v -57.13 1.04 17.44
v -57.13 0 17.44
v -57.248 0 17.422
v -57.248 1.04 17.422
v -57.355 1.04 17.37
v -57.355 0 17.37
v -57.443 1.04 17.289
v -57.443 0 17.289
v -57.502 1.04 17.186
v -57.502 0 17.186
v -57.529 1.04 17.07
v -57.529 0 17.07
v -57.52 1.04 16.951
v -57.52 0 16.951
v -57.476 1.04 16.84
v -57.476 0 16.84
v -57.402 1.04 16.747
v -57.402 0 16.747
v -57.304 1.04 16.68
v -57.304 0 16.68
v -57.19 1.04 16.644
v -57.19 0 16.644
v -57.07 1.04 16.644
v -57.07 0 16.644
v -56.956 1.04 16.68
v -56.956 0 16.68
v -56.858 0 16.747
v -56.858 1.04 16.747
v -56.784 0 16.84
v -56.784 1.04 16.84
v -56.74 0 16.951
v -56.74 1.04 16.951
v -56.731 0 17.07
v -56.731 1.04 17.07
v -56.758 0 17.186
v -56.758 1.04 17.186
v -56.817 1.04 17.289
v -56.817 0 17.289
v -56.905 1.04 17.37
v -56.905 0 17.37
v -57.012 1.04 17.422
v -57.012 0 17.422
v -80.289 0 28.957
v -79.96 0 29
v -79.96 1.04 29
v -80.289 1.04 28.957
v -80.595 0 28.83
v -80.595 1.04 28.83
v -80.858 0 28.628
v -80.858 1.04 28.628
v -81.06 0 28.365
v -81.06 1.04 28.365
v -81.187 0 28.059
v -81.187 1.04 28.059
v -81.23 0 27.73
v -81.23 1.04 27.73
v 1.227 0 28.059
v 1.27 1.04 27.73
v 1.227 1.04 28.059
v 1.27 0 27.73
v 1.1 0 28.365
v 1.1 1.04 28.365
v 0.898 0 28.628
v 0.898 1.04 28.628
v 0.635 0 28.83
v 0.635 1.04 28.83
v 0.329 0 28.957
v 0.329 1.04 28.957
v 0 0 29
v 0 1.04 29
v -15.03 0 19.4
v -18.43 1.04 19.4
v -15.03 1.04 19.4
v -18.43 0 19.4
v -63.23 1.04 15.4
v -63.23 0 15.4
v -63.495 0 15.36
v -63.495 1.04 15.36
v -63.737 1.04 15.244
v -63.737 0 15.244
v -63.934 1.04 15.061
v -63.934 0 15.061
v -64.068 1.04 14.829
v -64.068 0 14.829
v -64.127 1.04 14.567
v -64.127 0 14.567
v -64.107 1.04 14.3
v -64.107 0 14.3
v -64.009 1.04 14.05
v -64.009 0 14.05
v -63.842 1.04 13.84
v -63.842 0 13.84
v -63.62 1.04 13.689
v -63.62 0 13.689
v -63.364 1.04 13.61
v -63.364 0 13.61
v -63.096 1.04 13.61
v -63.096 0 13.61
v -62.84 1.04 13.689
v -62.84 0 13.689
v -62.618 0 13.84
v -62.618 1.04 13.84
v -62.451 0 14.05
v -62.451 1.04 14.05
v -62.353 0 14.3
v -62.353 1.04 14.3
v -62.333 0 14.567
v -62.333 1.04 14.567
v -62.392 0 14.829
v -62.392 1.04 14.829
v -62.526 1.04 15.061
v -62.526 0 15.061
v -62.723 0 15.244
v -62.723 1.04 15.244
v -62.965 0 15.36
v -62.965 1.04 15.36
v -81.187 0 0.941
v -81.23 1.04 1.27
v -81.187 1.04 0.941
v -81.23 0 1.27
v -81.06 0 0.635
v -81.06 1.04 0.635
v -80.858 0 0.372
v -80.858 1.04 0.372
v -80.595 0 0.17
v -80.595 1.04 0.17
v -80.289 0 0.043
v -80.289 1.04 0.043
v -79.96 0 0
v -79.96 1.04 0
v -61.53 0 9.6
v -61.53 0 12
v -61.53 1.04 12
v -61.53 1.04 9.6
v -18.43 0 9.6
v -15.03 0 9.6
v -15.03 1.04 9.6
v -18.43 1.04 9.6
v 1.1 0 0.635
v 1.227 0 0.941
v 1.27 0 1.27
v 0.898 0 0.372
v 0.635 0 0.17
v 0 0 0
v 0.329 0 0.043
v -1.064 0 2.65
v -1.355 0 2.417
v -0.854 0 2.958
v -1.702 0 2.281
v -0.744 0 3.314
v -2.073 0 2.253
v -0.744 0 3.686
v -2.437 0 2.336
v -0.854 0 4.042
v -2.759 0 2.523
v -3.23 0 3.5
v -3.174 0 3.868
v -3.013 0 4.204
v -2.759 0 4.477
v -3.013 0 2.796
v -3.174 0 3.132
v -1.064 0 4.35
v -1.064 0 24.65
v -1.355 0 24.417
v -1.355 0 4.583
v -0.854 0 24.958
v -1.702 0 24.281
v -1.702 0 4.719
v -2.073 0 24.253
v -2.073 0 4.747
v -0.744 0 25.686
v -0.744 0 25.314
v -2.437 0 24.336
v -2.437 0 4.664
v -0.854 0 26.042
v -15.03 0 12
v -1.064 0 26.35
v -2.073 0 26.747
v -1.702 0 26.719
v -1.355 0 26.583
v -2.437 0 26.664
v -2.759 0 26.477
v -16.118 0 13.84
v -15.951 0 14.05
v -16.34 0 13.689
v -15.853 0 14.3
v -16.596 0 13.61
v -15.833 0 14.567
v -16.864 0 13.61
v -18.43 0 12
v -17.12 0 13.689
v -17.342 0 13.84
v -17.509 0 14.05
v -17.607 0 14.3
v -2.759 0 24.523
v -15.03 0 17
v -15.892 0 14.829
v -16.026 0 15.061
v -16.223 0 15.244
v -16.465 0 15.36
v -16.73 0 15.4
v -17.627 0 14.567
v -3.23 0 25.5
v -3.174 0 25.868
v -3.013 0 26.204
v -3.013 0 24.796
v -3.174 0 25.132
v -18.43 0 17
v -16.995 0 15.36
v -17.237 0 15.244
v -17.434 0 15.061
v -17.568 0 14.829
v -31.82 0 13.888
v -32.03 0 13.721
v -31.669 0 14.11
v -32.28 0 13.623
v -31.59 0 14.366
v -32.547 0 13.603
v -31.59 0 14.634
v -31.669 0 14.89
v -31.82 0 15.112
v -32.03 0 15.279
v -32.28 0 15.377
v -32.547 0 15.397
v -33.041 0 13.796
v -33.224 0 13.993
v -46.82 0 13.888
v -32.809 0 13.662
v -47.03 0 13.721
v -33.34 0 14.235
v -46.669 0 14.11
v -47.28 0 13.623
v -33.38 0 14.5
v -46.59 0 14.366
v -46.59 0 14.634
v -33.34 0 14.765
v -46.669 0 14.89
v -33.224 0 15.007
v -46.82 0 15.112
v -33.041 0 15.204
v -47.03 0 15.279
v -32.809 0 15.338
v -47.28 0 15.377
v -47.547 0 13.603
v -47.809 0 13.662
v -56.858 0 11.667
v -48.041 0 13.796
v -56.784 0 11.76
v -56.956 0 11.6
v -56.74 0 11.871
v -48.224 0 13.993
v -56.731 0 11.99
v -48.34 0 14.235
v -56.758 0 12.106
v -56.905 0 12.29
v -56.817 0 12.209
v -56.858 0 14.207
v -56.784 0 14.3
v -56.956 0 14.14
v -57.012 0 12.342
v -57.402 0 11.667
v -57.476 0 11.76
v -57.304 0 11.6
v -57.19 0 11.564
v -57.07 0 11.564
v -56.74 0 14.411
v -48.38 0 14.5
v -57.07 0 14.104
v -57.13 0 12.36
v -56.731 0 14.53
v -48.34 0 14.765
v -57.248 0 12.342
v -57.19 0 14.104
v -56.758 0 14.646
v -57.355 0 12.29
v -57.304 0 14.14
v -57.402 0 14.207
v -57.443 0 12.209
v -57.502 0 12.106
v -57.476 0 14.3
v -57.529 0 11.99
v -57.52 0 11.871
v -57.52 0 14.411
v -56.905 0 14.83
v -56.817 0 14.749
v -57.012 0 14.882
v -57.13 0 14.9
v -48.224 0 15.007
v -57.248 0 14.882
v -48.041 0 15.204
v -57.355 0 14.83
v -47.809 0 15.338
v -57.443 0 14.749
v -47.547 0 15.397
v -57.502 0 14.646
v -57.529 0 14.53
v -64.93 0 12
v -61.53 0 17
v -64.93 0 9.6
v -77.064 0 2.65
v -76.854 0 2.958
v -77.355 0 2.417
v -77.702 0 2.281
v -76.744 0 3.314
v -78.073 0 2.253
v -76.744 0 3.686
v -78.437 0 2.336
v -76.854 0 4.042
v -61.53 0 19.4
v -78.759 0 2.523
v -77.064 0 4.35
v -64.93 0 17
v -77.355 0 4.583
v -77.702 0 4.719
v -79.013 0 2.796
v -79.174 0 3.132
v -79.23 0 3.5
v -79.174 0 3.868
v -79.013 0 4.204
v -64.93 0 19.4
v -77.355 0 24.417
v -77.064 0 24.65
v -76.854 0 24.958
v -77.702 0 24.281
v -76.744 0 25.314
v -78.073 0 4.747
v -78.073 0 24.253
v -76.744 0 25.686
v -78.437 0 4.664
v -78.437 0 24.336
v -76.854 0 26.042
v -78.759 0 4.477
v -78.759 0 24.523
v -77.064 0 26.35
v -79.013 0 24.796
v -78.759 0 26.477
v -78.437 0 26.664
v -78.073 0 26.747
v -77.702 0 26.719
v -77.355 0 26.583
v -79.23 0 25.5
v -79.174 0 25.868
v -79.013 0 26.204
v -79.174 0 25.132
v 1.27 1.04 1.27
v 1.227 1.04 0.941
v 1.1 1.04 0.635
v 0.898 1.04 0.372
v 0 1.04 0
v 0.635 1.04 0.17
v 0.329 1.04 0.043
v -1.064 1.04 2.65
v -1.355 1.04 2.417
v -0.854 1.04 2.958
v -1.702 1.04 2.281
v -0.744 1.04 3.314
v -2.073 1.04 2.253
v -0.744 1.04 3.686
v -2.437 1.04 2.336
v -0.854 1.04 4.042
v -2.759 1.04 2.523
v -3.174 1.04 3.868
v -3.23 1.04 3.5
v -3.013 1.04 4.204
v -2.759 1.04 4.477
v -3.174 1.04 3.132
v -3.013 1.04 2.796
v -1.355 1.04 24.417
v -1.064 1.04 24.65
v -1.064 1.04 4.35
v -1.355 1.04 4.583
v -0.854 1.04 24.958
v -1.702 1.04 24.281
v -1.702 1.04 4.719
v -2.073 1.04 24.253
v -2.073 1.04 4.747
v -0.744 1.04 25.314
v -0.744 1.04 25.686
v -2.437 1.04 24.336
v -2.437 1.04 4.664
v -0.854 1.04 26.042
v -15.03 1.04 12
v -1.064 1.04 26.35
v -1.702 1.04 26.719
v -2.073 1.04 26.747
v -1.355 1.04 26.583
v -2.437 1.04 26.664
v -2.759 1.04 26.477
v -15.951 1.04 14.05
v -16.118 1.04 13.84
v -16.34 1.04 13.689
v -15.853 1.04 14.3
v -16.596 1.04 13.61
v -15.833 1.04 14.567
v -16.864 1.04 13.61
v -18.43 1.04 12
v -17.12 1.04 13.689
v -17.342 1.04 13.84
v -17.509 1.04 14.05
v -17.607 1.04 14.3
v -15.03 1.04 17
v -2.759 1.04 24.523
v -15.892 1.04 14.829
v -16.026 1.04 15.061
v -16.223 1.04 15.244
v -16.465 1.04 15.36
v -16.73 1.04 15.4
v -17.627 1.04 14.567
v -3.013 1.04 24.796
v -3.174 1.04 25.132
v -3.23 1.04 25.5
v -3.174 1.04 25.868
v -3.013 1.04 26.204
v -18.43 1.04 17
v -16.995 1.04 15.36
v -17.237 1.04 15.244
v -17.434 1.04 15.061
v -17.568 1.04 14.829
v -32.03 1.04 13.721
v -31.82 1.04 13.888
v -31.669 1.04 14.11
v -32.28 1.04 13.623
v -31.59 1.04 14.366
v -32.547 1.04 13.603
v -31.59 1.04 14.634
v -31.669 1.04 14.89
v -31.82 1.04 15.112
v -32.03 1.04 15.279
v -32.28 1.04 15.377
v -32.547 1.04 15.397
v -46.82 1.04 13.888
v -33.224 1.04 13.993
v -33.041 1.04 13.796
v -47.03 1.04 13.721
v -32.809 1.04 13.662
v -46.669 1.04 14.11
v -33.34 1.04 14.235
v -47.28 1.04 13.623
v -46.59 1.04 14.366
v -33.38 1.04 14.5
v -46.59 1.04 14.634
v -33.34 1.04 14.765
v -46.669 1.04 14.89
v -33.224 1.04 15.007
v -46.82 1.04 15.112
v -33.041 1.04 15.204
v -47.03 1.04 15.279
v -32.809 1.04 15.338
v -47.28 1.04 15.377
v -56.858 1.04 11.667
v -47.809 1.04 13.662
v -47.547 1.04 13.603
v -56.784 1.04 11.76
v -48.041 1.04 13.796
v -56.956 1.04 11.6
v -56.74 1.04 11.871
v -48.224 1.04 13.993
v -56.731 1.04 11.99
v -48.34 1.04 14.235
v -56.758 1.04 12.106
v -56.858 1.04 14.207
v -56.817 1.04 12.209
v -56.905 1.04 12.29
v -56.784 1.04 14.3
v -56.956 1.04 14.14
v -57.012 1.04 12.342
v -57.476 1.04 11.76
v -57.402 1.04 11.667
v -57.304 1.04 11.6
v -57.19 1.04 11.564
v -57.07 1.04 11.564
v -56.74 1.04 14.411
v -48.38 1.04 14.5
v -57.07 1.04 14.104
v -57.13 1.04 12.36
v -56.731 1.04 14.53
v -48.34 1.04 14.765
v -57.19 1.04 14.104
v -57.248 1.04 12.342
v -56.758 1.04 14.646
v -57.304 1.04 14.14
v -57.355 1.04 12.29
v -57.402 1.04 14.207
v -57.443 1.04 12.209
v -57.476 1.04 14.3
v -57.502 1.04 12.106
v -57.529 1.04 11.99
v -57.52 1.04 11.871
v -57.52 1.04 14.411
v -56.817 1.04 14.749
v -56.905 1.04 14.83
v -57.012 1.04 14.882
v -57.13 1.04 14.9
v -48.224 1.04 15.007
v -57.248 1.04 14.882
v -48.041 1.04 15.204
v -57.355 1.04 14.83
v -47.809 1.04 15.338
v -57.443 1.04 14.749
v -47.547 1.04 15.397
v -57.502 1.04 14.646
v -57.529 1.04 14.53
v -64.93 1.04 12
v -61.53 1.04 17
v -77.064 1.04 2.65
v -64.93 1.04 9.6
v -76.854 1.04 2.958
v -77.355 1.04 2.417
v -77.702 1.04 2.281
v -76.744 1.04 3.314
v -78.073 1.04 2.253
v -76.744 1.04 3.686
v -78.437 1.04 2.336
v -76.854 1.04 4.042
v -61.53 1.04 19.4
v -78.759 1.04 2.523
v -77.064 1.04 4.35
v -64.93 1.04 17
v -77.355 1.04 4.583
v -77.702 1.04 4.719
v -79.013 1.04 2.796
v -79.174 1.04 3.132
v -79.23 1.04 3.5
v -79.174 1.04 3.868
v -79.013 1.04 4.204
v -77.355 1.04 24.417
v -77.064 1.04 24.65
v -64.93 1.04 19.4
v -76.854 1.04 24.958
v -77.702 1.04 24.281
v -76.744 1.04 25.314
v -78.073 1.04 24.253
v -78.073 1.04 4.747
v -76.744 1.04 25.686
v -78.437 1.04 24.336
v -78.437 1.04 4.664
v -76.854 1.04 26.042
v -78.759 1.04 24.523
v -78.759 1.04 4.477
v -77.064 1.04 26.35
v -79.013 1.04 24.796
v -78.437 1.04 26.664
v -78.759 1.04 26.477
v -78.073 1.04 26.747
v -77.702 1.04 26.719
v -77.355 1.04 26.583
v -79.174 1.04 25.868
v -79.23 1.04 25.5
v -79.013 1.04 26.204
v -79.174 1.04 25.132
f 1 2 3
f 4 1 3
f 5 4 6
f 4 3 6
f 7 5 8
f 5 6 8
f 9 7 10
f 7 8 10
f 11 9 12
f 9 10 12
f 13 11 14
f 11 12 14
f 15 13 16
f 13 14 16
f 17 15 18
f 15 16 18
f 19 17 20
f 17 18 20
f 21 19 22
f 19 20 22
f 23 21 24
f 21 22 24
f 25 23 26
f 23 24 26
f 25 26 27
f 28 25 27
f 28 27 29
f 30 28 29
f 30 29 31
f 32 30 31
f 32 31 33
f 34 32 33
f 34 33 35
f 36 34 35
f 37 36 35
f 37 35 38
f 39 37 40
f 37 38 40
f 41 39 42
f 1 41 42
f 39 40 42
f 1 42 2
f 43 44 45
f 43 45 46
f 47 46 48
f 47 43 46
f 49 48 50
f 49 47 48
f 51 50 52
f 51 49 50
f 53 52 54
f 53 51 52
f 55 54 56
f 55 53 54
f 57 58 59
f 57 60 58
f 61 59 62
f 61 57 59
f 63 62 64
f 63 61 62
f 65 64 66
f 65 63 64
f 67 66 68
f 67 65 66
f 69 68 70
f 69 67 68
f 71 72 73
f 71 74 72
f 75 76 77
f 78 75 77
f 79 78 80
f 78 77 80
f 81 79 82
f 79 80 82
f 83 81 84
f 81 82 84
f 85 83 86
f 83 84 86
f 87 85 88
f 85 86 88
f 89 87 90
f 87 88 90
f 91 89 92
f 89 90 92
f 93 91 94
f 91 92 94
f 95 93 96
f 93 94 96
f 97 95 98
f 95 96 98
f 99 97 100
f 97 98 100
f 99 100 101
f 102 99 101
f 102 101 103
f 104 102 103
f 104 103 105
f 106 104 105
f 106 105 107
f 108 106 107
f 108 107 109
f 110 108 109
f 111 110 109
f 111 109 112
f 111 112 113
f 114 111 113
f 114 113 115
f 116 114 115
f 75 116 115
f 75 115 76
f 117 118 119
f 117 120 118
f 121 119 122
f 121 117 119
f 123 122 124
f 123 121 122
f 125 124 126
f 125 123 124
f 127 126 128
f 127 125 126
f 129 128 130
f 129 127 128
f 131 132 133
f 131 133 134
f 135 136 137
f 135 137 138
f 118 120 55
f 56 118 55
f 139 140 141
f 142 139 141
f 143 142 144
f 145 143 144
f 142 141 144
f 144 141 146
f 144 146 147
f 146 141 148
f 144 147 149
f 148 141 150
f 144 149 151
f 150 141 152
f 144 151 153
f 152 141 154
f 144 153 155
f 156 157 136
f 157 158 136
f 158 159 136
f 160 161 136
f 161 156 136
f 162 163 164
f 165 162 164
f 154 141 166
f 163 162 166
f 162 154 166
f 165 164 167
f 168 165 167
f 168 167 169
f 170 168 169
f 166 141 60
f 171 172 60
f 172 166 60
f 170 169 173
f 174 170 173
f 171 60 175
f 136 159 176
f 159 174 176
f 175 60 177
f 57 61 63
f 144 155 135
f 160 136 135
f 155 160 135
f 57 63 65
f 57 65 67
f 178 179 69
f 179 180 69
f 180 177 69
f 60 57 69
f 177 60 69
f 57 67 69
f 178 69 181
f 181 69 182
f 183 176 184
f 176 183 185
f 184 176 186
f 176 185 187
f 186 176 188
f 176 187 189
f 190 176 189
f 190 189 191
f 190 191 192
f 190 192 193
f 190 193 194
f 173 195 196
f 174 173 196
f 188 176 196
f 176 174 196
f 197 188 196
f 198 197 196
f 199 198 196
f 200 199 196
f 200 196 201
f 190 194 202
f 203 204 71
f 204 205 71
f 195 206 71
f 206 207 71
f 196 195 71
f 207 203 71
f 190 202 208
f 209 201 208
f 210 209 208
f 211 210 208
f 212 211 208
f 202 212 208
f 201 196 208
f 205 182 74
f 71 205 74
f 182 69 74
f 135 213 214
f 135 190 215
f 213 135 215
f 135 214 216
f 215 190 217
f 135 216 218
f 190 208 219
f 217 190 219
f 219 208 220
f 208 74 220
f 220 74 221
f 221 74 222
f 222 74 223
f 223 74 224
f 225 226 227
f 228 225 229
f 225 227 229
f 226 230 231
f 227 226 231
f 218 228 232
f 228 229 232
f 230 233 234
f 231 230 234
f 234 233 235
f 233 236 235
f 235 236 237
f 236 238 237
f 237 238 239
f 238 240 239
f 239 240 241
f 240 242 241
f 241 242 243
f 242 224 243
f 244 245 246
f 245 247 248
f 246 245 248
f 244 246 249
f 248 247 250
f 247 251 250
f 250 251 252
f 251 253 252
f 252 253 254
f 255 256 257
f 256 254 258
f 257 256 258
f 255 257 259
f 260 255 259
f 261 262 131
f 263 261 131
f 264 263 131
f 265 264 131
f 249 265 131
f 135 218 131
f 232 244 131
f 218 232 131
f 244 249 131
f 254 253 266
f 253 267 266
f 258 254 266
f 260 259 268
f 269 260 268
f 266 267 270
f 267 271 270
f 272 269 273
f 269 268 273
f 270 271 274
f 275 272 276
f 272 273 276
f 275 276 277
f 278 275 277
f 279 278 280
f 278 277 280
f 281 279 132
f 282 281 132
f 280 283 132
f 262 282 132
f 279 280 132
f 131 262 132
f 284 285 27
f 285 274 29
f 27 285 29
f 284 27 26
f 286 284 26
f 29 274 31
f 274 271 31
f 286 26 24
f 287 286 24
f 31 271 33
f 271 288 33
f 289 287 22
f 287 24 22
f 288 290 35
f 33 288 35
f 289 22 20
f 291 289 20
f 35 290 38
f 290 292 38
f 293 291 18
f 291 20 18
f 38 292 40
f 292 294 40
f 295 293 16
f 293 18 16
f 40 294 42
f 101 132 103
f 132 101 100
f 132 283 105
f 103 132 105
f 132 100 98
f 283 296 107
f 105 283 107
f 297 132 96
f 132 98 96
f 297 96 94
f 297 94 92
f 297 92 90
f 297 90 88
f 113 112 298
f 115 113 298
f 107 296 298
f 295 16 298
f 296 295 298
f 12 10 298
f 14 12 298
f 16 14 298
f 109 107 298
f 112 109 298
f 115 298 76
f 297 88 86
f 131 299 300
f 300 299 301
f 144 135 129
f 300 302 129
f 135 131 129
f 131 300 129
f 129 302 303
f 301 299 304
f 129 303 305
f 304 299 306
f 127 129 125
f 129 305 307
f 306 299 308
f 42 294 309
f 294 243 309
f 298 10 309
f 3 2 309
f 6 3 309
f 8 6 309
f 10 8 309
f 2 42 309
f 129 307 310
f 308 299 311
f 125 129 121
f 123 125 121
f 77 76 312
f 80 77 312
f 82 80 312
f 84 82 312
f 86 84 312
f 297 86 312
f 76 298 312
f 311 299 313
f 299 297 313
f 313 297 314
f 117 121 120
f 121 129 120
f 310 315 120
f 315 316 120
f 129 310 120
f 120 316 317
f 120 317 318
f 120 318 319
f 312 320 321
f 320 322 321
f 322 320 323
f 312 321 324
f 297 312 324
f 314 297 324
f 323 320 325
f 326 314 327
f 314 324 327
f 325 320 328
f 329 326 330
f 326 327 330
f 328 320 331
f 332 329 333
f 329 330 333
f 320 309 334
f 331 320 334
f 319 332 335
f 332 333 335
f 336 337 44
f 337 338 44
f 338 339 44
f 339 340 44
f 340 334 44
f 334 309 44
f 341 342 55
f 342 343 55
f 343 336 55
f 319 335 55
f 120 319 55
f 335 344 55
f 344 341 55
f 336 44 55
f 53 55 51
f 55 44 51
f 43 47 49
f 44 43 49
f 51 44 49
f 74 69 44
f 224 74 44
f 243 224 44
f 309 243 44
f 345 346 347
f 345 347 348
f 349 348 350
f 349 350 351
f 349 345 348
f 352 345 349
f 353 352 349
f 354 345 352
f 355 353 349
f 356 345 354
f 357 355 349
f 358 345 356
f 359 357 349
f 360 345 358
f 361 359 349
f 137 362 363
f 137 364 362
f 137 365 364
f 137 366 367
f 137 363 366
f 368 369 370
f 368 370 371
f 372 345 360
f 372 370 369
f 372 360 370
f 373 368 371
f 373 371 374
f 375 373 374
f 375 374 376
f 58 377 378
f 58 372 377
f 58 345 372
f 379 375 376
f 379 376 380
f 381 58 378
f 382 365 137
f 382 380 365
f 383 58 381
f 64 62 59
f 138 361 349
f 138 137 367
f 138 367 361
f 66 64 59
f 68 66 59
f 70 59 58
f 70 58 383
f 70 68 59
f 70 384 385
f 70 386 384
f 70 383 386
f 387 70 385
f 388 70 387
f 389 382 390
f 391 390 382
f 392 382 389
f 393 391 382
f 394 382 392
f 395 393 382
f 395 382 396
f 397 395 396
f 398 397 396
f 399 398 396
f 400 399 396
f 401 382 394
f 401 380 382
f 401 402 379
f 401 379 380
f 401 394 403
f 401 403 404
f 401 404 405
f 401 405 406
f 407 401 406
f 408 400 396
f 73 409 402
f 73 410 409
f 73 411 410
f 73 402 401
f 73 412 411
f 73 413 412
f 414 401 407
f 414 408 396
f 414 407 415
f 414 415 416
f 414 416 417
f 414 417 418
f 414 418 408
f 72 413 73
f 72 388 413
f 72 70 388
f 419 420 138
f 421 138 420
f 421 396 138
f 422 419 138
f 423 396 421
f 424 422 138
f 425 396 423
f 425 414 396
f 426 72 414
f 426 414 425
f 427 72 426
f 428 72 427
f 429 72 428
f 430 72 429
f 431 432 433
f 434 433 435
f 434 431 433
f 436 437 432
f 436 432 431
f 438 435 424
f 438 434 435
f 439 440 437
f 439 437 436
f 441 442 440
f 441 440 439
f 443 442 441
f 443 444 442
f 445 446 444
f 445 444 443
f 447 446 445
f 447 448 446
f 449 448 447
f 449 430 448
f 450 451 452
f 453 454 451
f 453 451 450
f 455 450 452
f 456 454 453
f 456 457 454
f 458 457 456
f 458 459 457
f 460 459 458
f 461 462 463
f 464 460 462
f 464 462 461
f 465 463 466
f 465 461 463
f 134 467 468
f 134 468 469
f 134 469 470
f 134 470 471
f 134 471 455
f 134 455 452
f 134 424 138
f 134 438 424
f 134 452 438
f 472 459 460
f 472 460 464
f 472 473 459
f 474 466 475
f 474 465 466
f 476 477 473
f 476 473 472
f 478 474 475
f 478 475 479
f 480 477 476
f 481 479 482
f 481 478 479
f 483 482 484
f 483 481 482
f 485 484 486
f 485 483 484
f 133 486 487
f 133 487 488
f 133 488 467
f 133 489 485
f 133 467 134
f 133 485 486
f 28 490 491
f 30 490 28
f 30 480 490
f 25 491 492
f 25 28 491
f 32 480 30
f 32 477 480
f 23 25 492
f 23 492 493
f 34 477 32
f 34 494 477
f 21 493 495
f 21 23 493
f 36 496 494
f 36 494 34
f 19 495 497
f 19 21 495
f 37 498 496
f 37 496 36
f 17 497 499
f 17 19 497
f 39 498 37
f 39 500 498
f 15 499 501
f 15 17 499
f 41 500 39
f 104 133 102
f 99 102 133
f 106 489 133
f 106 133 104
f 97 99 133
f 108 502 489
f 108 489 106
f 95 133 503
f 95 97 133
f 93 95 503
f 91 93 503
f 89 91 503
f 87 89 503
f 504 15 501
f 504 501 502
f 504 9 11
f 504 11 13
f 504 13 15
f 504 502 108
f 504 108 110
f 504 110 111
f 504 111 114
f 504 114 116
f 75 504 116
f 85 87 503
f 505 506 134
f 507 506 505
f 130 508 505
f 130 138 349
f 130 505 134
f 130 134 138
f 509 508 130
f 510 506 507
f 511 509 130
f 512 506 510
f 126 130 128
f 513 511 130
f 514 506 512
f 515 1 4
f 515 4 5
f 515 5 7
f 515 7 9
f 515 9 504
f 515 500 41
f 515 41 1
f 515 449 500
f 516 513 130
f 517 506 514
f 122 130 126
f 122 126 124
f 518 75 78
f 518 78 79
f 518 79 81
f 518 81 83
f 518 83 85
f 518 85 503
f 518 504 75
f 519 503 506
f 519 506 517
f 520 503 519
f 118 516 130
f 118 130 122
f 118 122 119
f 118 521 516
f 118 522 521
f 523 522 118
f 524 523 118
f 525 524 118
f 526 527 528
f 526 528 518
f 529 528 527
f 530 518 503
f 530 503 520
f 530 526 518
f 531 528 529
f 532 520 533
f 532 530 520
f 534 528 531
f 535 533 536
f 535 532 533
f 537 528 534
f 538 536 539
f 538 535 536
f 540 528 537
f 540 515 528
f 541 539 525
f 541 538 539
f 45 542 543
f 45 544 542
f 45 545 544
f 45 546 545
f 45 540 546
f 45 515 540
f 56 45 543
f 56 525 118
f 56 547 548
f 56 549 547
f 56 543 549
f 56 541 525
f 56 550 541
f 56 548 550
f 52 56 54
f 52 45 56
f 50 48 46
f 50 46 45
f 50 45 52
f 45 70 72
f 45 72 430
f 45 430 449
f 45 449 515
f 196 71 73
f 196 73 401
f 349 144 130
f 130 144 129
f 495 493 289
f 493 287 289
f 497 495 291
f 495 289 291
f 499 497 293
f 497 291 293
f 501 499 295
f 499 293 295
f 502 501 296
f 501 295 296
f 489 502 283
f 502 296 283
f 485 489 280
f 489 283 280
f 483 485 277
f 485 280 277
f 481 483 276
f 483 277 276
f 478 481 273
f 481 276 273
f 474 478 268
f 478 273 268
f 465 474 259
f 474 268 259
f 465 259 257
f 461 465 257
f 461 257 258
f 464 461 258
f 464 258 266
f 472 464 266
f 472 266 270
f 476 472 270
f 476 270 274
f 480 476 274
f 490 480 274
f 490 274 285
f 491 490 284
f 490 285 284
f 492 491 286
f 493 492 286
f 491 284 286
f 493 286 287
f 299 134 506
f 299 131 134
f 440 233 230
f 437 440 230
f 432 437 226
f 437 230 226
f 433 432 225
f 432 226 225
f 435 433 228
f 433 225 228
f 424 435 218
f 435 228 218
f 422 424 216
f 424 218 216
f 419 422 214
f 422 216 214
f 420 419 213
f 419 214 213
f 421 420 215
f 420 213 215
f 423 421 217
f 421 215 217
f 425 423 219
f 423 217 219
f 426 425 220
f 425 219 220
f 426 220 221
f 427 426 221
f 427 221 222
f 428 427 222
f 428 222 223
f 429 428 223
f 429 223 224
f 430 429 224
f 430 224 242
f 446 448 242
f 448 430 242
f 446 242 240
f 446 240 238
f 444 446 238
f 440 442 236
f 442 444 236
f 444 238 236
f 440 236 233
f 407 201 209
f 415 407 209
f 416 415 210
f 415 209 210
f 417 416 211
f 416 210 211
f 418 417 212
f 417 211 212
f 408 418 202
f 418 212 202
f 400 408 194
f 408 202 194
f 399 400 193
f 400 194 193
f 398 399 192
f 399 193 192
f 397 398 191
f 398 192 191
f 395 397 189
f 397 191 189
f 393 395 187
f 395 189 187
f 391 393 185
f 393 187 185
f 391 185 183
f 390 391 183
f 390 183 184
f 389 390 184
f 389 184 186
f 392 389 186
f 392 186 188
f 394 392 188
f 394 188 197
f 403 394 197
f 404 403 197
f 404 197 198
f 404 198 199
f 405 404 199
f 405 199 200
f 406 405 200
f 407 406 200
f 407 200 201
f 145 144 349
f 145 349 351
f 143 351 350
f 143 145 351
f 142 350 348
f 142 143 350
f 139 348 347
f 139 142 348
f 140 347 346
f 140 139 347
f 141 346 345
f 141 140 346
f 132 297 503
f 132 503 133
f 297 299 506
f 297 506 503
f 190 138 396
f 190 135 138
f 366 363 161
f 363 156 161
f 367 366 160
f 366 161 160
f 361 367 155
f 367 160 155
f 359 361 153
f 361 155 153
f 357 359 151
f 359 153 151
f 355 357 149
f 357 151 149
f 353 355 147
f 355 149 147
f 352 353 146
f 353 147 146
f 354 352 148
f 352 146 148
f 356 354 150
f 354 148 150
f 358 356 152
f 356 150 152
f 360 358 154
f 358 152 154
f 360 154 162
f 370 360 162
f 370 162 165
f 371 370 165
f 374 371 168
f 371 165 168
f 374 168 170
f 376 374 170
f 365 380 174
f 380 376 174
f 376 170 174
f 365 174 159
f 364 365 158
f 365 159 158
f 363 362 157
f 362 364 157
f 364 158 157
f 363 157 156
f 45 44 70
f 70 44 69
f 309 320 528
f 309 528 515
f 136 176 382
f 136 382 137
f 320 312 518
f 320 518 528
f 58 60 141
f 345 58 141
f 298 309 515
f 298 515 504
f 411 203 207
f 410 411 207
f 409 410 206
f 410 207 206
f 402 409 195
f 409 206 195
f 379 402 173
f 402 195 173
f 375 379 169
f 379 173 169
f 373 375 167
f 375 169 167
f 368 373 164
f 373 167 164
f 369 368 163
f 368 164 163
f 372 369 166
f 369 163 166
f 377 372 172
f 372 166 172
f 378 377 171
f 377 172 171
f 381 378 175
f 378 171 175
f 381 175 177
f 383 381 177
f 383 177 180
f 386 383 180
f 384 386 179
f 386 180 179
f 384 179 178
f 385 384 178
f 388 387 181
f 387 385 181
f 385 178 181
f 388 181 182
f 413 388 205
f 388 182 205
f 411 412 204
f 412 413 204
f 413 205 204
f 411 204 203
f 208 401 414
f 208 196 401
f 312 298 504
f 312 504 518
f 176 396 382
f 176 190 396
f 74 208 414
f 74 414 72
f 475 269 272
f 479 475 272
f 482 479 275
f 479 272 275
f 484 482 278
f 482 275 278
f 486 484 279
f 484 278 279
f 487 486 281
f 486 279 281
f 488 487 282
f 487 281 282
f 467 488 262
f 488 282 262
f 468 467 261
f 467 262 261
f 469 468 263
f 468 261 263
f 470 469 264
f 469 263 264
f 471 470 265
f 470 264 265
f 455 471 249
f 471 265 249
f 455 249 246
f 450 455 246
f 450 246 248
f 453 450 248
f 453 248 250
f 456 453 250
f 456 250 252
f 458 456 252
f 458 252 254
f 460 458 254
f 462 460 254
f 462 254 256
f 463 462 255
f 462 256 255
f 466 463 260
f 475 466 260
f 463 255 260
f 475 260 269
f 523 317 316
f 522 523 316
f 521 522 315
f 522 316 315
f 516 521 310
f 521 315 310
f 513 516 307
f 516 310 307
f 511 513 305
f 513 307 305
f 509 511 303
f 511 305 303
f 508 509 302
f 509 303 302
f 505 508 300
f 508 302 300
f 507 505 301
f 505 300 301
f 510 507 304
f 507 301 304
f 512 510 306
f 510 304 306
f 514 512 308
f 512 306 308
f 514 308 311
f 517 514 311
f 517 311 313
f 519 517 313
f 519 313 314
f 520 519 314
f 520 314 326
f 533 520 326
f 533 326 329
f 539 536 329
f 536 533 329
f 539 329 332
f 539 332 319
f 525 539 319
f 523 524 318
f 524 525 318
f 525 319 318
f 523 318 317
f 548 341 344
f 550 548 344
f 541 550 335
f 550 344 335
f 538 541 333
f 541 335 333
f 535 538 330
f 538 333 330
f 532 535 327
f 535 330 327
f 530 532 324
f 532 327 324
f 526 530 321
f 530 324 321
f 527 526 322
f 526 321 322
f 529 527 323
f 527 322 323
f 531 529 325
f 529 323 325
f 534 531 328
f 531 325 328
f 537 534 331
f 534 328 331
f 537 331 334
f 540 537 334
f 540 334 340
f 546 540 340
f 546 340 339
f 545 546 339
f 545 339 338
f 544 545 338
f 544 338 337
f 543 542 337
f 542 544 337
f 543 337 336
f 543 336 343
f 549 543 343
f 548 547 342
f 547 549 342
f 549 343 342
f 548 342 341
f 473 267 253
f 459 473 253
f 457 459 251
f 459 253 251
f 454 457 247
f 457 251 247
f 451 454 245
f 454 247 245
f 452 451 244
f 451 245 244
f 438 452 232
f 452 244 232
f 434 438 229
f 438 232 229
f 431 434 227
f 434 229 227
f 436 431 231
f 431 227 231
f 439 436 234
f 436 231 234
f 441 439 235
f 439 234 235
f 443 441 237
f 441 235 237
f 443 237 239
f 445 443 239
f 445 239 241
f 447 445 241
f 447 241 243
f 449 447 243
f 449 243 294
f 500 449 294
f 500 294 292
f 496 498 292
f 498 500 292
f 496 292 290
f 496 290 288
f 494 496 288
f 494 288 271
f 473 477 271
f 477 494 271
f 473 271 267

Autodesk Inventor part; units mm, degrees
ref_plane "YZ Plane" through (0, 0, 0) normal (1, 0, 0) x (0, 1, 0)
ref_plane "XZ Plane" through (0, 0, 0) normal (0, 1, 0) x (-1, 0, 0)
ref_plane "XY Plane" through (0, 0, 0) normal (0, 0, 1) x (1, 0, 0)
sketch "Boceto1" plane through (0, 0, 0) normal (0, 1, 0) x (-1, 0, 0)
  arc A0 (-1.27, 1.27) -> (0, 0) centre (0, 1.27) ccw
  line L0 (0, 0) -> (79.96, 0)
  arc A1 (79.96, 0) -> (81.23, 1.27) centre (79.96, 1.27) ccw
  line L1 (81.23, 1.27) -> (81.23, 27.73)
  arc A2 (81.23, 27.73) -> (79.96, 29) centre (79.96, 27.73) ccw
  line L2 (79.96, 29) -> (0, 29)
  arc A3 (0, 29) -> (-1.27, 27.73) centre (0, 27.73) ccw
  line L3 (-1.27, 27.73) -> (-1.27, 1.27)
  circle A4 centre (77.98, 3.5) radius 1.25
  circle A5 centre (1.98, 25.5) radius 1.25
  circle A6 centre (1.98, 3.5) radius 1.25
  circle A7 centre (77.98, 25.5) radius 1.25
  circle A8 centre (47.48, 14.5) radius 0.9
  circle A9 centre (32.48, 14.5) radius 0.9
  point P0 (0, 0)
extrude "Extrusión1" add sketch "Boceto1" along normal blind 1.04
sketch "Boceto3" plane through (0, 1.04, 0) normal (0, 1, 0) x (1, 0, 0)
  circle A0 centre (-63.23, -14.5) radius 0.9
  circle A1 centre (-16.73, -14.5) radius 0.9
  line L0 (-81.23, -1.27) -> (-81.23, -27.73) projected
  line L1 (0, 0) -> (-79.96, 0) projected
  line L2 (1.27, -27.73) -> (1.27, -1.27) projected
  line L3 (-79.96, -29) -> (0, -29) projected
  dimension "d15" = 1.8
  dimension "d16" = 1.8
  dimension "d17" = 18
  dimension "d18" = 14.5
  dimension "d19" = 18
  dimension "d20" = 14.5
hole "Agujero2" at (-63.23, 1.04, 14.5) at (-16.73, 1.04, 14.5) direction (0, -1, 0) diameter 1.8 end through all
sketch "Boceto4" plane through (0, 1.04, 0) normal (0, 1, 0) x (1, 0, 0)
  circle A0 centre (-57.13, -17.04) radius 0.4
  line L0 (-81.23, -1.27) -> (-81.23, -27.73) projected
  line L1 (-79.96, -29) -> (0, -29) projected
  circle A1 centre (-57.13, -14.5) radius 0.4
  circle A2 centre (-57.13, -11.96) radius 0.4
  line L2 (0, 0) -> (-79.96, 0) projected
  dimension "d28" = 0.8
  dimension "d29" = 24.1
  dimension "d30" = 11.96
  dimension "d31" = 0.8
  dimension "d32" = 0.8
  dimension "d33" = 11.96
  dimension "d34" = 2.54
  dimension "d35" = 2.54
hole "Agujero3" at (-57.13, 1.04, 17.04) at (-57.13, 1.04, 14.5) at (-57.13, 1.04, 11.96) direction (0, -1, 0) diameter 0.8 end through all
sketch "Boceto5" plane through (0, 0, 0) normal (0, -1, 0) x (1, 0, 0)
  line L0 (-15.03, 9.6) -> (-18.43, 9.6)
  line L1 (-18.43, 9.6) -> (-18.43, 12)
  line L2 (-18.43, 12) -> (-15.03, 12)
  line L3 (-15.03, 12) -> (-15.03, 9.6)
  line L4 (-79.96, 29) -> (0, 29) projected
  line L5 (1.27, 27.73) -> (1.27, 1.27) projected
  line L6 (-15.03, 17) -> (-18.43, 17)
  line L7 (-18.43, 17) -> (-18.43, 19.4)
  line L8 (-18.43, 19.4) -> (-15.03, 19.4)
  line L9 (-15.03, 19.4) -> (-15.03, 17)
  line L10 (0, 0) -> (-79.96, 0) projected
  line L11 (-61.53, 9.6) -> (-64.93, 9.6)
  line L12 (-64.93, 9.6) -> (-64.93, 12)
  line L13 (-64.93, 12) -> (-61.53, 12)
  line L14 (-61.53, 12) -> (-61.53, 9.6)
  line L15 (-81.23, 1.27) -> (-81.23, 27.73) projected
  line L16 (-61.53, 17) -> (-64.93, 17)
  line L17 (-64.93, 17) -> (-64.93, 19.4)
  line L18 (-64.93, 19.4) -> (-61.53, 19.4)
  line L19 (-61.53, 19.4) -> (-61.53, 17)
  dimension "d43" = 3.4
  dimension "d44" = 2.4
  dimension "d47" = 16.3
  dimension "d48" = 2.4
  dimension "d49" = 9.6
  dimension "d50" = 9.6
  dimension "d51" = 3.4
  dimension "d52" = 2.4
  dimension "d53" = 9.6
  dimension "d54" = 16.3
  dimension "d55" = 3.4
  dimension "d56" = 2.4
  dimension "d57" = 16.3
  dimension "d58" = 9.6
extrude "Extrusión2" cut sketch "Boceto5" against normal through all
sketch "Boceto6" plane through (0, 0, 0) normal (0, -1, 0) x (1, 0, 0)
  point P0 (0, 0)
properties part number "Interstage A"
